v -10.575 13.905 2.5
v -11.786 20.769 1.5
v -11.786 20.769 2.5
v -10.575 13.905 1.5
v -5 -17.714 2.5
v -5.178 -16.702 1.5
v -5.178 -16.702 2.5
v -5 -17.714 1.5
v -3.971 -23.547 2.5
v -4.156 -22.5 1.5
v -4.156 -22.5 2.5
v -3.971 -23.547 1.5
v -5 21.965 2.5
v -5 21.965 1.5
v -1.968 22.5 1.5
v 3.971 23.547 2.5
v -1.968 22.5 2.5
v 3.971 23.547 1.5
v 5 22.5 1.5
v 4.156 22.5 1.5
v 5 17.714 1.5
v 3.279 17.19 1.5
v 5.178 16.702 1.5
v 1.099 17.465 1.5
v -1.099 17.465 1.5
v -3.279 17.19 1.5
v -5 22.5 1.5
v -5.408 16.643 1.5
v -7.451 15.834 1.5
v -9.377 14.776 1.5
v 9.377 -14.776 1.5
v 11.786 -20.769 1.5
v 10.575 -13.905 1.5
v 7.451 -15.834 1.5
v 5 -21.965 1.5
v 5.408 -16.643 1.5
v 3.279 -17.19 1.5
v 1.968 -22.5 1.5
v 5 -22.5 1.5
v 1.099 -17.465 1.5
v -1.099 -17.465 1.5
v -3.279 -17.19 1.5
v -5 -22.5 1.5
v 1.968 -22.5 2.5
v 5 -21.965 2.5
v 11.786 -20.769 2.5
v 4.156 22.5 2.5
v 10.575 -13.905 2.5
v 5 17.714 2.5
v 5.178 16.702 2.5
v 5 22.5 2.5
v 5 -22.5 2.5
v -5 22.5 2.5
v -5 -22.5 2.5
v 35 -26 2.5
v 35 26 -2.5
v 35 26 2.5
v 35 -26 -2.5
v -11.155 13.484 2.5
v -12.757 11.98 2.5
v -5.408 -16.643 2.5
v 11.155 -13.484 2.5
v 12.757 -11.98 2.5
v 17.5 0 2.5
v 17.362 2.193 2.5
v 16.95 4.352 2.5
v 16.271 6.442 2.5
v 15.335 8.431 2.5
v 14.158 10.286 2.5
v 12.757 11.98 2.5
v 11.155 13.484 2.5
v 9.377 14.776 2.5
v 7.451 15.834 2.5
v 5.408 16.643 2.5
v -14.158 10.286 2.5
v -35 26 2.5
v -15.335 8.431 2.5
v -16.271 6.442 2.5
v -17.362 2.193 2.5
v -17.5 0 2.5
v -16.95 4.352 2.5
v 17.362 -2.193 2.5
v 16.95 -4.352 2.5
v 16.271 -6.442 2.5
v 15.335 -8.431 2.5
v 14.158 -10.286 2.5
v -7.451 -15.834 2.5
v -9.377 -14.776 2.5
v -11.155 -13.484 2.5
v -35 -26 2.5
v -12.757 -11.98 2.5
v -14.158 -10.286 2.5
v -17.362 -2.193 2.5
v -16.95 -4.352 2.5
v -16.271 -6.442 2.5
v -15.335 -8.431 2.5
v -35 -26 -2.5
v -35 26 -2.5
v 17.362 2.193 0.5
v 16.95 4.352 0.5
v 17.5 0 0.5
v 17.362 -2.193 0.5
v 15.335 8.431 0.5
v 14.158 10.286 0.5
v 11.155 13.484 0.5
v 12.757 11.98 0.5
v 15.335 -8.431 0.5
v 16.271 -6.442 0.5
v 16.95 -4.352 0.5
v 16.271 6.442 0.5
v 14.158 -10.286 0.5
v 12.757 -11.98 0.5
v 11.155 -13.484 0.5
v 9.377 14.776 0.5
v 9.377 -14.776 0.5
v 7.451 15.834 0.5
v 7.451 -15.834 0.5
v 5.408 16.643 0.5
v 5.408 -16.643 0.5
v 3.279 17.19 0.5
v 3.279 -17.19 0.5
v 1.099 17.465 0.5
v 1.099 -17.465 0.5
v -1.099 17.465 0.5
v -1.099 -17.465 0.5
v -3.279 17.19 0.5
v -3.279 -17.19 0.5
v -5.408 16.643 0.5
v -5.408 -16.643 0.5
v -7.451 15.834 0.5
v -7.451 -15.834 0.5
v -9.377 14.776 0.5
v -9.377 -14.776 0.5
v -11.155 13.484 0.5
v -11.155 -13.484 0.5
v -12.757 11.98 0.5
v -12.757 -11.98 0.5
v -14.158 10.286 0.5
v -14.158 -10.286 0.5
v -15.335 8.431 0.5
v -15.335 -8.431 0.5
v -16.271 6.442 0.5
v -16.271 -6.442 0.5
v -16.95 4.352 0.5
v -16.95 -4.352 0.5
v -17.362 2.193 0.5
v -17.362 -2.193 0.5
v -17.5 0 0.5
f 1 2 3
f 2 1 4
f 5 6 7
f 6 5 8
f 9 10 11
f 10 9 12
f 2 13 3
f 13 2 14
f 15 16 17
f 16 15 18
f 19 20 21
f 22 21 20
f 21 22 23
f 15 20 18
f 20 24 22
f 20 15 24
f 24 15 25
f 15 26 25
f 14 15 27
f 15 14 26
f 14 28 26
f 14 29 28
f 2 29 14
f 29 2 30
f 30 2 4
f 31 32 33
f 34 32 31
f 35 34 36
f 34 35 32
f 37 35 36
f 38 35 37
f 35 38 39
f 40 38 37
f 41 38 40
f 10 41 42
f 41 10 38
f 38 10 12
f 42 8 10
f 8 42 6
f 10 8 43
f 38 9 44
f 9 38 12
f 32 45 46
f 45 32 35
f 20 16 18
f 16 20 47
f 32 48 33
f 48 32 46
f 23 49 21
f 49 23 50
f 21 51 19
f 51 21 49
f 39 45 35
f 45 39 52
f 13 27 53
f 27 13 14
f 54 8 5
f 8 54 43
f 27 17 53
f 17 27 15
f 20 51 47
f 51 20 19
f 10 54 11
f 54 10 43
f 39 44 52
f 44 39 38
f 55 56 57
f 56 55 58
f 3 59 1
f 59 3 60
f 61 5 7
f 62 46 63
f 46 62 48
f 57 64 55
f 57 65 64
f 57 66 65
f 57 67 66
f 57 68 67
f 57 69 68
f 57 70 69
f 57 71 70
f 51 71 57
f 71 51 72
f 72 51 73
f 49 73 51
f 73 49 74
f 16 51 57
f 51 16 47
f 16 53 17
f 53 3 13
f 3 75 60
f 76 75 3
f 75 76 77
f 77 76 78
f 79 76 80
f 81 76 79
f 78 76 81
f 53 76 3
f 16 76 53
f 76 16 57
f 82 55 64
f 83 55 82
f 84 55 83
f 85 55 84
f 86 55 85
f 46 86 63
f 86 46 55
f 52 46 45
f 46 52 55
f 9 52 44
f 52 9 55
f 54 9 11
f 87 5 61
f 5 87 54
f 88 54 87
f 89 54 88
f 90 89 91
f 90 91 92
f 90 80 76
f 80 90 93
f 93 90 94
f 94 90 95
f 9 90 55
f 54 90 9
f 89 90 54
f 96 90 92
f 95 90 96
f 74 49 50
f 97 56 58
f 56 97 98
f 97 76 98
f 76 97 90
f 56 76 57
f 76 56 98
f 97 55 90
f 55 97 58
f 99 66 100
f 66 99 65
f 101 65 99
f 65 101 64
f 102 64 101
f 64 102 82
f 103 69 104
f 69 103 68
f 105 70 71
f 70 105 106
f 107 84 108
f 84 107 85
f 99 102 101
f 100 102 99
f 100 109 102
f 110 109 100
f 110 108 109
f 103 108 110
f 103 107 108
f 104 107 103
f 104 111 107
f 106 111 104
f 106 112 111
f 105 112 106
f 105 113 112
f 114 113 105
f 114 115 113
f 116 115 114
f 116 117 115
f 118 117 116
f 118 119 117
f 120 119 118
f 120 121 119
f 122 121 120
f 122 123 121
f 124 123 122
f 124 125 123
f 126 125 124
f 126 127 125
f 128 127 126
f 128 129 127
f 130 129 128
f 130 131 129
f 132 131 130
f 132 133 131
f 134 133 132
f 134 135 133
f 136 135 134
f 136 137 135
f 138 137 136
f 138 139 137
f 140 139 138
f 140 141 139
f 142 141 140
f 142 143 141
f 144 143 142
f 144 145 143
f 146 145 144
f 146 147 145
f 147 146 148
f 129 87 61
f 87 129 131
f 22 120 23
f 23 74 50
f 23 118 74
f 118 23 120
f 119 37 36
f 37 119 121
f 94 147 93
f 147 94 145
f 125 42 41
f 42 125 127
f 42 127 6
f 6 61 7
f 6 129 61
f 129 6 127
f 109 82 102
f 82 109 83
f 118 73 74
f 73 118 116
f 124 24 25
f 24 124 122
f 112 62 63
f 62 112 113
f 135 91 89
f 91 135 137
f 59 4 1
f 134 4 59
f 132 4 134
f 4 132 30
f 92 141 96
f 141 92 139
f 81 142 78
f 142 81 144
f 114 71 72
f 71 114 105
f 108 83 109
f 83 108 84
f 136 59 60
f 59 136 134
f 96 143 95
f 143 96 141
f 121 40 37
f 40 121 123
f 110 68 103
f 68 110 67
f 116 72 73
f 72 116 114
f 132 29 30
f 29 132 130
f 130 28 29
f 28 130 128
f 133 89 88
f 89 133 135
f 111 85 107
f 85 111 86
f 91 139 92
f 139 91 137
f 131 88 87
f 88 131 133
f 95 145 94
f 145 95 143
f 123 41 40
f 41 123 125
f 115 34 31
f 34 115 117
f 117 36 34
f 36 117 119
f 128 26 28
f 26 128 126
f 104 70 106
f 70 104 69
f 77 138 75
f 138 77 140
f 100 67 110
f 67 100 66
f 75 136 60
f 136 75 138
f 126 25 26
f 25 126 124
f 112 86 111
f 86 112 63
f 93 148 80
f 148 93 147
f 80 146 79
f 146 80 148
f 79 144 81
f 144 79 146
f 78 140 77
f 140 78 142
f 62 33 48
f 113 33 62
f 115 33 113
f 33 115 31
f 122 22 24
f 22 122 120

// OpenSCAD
rotate([0,0,0]) tilting_stage();




module tilting_stage() {
    difference() {
        cube([70,52,5],center=true);
        translate([0,0,3]) cylinder(h=5,d=35,$fn=50,center=true);
        translate([0,0,12]) cylinder(h=20,d=33,$fn=50,center=true);
        translate([0,0,9]) tabs_notch();
    }
}

module tabs_notch() {
    rotate([0,0,10]) cube([16,45,15],center=true);
    cube([10,45,15],center=true);
}




module tilting_stage_John() {
    difference() {
        union() { 
            cube([70,52,5],center=true);
            rotate([0,90,0]) cylinder(h=80,d=5,$fn=25,center=true);
            translate([0,-25,0]) intersection() {
              %rotate([0,90+10,0]) cylinder(h=30,d=4,$fn=25,center=true);
              cube([25,8,5],center=true);
            }
        }
        translate([0,0,3]) cylinder(h=5,d=35,$fn=50,center=true);
        translate([0,0,0]) cylinder(h=20,d=33,$fn=50,center=true);
        tabs_notch();
    }
    
}
